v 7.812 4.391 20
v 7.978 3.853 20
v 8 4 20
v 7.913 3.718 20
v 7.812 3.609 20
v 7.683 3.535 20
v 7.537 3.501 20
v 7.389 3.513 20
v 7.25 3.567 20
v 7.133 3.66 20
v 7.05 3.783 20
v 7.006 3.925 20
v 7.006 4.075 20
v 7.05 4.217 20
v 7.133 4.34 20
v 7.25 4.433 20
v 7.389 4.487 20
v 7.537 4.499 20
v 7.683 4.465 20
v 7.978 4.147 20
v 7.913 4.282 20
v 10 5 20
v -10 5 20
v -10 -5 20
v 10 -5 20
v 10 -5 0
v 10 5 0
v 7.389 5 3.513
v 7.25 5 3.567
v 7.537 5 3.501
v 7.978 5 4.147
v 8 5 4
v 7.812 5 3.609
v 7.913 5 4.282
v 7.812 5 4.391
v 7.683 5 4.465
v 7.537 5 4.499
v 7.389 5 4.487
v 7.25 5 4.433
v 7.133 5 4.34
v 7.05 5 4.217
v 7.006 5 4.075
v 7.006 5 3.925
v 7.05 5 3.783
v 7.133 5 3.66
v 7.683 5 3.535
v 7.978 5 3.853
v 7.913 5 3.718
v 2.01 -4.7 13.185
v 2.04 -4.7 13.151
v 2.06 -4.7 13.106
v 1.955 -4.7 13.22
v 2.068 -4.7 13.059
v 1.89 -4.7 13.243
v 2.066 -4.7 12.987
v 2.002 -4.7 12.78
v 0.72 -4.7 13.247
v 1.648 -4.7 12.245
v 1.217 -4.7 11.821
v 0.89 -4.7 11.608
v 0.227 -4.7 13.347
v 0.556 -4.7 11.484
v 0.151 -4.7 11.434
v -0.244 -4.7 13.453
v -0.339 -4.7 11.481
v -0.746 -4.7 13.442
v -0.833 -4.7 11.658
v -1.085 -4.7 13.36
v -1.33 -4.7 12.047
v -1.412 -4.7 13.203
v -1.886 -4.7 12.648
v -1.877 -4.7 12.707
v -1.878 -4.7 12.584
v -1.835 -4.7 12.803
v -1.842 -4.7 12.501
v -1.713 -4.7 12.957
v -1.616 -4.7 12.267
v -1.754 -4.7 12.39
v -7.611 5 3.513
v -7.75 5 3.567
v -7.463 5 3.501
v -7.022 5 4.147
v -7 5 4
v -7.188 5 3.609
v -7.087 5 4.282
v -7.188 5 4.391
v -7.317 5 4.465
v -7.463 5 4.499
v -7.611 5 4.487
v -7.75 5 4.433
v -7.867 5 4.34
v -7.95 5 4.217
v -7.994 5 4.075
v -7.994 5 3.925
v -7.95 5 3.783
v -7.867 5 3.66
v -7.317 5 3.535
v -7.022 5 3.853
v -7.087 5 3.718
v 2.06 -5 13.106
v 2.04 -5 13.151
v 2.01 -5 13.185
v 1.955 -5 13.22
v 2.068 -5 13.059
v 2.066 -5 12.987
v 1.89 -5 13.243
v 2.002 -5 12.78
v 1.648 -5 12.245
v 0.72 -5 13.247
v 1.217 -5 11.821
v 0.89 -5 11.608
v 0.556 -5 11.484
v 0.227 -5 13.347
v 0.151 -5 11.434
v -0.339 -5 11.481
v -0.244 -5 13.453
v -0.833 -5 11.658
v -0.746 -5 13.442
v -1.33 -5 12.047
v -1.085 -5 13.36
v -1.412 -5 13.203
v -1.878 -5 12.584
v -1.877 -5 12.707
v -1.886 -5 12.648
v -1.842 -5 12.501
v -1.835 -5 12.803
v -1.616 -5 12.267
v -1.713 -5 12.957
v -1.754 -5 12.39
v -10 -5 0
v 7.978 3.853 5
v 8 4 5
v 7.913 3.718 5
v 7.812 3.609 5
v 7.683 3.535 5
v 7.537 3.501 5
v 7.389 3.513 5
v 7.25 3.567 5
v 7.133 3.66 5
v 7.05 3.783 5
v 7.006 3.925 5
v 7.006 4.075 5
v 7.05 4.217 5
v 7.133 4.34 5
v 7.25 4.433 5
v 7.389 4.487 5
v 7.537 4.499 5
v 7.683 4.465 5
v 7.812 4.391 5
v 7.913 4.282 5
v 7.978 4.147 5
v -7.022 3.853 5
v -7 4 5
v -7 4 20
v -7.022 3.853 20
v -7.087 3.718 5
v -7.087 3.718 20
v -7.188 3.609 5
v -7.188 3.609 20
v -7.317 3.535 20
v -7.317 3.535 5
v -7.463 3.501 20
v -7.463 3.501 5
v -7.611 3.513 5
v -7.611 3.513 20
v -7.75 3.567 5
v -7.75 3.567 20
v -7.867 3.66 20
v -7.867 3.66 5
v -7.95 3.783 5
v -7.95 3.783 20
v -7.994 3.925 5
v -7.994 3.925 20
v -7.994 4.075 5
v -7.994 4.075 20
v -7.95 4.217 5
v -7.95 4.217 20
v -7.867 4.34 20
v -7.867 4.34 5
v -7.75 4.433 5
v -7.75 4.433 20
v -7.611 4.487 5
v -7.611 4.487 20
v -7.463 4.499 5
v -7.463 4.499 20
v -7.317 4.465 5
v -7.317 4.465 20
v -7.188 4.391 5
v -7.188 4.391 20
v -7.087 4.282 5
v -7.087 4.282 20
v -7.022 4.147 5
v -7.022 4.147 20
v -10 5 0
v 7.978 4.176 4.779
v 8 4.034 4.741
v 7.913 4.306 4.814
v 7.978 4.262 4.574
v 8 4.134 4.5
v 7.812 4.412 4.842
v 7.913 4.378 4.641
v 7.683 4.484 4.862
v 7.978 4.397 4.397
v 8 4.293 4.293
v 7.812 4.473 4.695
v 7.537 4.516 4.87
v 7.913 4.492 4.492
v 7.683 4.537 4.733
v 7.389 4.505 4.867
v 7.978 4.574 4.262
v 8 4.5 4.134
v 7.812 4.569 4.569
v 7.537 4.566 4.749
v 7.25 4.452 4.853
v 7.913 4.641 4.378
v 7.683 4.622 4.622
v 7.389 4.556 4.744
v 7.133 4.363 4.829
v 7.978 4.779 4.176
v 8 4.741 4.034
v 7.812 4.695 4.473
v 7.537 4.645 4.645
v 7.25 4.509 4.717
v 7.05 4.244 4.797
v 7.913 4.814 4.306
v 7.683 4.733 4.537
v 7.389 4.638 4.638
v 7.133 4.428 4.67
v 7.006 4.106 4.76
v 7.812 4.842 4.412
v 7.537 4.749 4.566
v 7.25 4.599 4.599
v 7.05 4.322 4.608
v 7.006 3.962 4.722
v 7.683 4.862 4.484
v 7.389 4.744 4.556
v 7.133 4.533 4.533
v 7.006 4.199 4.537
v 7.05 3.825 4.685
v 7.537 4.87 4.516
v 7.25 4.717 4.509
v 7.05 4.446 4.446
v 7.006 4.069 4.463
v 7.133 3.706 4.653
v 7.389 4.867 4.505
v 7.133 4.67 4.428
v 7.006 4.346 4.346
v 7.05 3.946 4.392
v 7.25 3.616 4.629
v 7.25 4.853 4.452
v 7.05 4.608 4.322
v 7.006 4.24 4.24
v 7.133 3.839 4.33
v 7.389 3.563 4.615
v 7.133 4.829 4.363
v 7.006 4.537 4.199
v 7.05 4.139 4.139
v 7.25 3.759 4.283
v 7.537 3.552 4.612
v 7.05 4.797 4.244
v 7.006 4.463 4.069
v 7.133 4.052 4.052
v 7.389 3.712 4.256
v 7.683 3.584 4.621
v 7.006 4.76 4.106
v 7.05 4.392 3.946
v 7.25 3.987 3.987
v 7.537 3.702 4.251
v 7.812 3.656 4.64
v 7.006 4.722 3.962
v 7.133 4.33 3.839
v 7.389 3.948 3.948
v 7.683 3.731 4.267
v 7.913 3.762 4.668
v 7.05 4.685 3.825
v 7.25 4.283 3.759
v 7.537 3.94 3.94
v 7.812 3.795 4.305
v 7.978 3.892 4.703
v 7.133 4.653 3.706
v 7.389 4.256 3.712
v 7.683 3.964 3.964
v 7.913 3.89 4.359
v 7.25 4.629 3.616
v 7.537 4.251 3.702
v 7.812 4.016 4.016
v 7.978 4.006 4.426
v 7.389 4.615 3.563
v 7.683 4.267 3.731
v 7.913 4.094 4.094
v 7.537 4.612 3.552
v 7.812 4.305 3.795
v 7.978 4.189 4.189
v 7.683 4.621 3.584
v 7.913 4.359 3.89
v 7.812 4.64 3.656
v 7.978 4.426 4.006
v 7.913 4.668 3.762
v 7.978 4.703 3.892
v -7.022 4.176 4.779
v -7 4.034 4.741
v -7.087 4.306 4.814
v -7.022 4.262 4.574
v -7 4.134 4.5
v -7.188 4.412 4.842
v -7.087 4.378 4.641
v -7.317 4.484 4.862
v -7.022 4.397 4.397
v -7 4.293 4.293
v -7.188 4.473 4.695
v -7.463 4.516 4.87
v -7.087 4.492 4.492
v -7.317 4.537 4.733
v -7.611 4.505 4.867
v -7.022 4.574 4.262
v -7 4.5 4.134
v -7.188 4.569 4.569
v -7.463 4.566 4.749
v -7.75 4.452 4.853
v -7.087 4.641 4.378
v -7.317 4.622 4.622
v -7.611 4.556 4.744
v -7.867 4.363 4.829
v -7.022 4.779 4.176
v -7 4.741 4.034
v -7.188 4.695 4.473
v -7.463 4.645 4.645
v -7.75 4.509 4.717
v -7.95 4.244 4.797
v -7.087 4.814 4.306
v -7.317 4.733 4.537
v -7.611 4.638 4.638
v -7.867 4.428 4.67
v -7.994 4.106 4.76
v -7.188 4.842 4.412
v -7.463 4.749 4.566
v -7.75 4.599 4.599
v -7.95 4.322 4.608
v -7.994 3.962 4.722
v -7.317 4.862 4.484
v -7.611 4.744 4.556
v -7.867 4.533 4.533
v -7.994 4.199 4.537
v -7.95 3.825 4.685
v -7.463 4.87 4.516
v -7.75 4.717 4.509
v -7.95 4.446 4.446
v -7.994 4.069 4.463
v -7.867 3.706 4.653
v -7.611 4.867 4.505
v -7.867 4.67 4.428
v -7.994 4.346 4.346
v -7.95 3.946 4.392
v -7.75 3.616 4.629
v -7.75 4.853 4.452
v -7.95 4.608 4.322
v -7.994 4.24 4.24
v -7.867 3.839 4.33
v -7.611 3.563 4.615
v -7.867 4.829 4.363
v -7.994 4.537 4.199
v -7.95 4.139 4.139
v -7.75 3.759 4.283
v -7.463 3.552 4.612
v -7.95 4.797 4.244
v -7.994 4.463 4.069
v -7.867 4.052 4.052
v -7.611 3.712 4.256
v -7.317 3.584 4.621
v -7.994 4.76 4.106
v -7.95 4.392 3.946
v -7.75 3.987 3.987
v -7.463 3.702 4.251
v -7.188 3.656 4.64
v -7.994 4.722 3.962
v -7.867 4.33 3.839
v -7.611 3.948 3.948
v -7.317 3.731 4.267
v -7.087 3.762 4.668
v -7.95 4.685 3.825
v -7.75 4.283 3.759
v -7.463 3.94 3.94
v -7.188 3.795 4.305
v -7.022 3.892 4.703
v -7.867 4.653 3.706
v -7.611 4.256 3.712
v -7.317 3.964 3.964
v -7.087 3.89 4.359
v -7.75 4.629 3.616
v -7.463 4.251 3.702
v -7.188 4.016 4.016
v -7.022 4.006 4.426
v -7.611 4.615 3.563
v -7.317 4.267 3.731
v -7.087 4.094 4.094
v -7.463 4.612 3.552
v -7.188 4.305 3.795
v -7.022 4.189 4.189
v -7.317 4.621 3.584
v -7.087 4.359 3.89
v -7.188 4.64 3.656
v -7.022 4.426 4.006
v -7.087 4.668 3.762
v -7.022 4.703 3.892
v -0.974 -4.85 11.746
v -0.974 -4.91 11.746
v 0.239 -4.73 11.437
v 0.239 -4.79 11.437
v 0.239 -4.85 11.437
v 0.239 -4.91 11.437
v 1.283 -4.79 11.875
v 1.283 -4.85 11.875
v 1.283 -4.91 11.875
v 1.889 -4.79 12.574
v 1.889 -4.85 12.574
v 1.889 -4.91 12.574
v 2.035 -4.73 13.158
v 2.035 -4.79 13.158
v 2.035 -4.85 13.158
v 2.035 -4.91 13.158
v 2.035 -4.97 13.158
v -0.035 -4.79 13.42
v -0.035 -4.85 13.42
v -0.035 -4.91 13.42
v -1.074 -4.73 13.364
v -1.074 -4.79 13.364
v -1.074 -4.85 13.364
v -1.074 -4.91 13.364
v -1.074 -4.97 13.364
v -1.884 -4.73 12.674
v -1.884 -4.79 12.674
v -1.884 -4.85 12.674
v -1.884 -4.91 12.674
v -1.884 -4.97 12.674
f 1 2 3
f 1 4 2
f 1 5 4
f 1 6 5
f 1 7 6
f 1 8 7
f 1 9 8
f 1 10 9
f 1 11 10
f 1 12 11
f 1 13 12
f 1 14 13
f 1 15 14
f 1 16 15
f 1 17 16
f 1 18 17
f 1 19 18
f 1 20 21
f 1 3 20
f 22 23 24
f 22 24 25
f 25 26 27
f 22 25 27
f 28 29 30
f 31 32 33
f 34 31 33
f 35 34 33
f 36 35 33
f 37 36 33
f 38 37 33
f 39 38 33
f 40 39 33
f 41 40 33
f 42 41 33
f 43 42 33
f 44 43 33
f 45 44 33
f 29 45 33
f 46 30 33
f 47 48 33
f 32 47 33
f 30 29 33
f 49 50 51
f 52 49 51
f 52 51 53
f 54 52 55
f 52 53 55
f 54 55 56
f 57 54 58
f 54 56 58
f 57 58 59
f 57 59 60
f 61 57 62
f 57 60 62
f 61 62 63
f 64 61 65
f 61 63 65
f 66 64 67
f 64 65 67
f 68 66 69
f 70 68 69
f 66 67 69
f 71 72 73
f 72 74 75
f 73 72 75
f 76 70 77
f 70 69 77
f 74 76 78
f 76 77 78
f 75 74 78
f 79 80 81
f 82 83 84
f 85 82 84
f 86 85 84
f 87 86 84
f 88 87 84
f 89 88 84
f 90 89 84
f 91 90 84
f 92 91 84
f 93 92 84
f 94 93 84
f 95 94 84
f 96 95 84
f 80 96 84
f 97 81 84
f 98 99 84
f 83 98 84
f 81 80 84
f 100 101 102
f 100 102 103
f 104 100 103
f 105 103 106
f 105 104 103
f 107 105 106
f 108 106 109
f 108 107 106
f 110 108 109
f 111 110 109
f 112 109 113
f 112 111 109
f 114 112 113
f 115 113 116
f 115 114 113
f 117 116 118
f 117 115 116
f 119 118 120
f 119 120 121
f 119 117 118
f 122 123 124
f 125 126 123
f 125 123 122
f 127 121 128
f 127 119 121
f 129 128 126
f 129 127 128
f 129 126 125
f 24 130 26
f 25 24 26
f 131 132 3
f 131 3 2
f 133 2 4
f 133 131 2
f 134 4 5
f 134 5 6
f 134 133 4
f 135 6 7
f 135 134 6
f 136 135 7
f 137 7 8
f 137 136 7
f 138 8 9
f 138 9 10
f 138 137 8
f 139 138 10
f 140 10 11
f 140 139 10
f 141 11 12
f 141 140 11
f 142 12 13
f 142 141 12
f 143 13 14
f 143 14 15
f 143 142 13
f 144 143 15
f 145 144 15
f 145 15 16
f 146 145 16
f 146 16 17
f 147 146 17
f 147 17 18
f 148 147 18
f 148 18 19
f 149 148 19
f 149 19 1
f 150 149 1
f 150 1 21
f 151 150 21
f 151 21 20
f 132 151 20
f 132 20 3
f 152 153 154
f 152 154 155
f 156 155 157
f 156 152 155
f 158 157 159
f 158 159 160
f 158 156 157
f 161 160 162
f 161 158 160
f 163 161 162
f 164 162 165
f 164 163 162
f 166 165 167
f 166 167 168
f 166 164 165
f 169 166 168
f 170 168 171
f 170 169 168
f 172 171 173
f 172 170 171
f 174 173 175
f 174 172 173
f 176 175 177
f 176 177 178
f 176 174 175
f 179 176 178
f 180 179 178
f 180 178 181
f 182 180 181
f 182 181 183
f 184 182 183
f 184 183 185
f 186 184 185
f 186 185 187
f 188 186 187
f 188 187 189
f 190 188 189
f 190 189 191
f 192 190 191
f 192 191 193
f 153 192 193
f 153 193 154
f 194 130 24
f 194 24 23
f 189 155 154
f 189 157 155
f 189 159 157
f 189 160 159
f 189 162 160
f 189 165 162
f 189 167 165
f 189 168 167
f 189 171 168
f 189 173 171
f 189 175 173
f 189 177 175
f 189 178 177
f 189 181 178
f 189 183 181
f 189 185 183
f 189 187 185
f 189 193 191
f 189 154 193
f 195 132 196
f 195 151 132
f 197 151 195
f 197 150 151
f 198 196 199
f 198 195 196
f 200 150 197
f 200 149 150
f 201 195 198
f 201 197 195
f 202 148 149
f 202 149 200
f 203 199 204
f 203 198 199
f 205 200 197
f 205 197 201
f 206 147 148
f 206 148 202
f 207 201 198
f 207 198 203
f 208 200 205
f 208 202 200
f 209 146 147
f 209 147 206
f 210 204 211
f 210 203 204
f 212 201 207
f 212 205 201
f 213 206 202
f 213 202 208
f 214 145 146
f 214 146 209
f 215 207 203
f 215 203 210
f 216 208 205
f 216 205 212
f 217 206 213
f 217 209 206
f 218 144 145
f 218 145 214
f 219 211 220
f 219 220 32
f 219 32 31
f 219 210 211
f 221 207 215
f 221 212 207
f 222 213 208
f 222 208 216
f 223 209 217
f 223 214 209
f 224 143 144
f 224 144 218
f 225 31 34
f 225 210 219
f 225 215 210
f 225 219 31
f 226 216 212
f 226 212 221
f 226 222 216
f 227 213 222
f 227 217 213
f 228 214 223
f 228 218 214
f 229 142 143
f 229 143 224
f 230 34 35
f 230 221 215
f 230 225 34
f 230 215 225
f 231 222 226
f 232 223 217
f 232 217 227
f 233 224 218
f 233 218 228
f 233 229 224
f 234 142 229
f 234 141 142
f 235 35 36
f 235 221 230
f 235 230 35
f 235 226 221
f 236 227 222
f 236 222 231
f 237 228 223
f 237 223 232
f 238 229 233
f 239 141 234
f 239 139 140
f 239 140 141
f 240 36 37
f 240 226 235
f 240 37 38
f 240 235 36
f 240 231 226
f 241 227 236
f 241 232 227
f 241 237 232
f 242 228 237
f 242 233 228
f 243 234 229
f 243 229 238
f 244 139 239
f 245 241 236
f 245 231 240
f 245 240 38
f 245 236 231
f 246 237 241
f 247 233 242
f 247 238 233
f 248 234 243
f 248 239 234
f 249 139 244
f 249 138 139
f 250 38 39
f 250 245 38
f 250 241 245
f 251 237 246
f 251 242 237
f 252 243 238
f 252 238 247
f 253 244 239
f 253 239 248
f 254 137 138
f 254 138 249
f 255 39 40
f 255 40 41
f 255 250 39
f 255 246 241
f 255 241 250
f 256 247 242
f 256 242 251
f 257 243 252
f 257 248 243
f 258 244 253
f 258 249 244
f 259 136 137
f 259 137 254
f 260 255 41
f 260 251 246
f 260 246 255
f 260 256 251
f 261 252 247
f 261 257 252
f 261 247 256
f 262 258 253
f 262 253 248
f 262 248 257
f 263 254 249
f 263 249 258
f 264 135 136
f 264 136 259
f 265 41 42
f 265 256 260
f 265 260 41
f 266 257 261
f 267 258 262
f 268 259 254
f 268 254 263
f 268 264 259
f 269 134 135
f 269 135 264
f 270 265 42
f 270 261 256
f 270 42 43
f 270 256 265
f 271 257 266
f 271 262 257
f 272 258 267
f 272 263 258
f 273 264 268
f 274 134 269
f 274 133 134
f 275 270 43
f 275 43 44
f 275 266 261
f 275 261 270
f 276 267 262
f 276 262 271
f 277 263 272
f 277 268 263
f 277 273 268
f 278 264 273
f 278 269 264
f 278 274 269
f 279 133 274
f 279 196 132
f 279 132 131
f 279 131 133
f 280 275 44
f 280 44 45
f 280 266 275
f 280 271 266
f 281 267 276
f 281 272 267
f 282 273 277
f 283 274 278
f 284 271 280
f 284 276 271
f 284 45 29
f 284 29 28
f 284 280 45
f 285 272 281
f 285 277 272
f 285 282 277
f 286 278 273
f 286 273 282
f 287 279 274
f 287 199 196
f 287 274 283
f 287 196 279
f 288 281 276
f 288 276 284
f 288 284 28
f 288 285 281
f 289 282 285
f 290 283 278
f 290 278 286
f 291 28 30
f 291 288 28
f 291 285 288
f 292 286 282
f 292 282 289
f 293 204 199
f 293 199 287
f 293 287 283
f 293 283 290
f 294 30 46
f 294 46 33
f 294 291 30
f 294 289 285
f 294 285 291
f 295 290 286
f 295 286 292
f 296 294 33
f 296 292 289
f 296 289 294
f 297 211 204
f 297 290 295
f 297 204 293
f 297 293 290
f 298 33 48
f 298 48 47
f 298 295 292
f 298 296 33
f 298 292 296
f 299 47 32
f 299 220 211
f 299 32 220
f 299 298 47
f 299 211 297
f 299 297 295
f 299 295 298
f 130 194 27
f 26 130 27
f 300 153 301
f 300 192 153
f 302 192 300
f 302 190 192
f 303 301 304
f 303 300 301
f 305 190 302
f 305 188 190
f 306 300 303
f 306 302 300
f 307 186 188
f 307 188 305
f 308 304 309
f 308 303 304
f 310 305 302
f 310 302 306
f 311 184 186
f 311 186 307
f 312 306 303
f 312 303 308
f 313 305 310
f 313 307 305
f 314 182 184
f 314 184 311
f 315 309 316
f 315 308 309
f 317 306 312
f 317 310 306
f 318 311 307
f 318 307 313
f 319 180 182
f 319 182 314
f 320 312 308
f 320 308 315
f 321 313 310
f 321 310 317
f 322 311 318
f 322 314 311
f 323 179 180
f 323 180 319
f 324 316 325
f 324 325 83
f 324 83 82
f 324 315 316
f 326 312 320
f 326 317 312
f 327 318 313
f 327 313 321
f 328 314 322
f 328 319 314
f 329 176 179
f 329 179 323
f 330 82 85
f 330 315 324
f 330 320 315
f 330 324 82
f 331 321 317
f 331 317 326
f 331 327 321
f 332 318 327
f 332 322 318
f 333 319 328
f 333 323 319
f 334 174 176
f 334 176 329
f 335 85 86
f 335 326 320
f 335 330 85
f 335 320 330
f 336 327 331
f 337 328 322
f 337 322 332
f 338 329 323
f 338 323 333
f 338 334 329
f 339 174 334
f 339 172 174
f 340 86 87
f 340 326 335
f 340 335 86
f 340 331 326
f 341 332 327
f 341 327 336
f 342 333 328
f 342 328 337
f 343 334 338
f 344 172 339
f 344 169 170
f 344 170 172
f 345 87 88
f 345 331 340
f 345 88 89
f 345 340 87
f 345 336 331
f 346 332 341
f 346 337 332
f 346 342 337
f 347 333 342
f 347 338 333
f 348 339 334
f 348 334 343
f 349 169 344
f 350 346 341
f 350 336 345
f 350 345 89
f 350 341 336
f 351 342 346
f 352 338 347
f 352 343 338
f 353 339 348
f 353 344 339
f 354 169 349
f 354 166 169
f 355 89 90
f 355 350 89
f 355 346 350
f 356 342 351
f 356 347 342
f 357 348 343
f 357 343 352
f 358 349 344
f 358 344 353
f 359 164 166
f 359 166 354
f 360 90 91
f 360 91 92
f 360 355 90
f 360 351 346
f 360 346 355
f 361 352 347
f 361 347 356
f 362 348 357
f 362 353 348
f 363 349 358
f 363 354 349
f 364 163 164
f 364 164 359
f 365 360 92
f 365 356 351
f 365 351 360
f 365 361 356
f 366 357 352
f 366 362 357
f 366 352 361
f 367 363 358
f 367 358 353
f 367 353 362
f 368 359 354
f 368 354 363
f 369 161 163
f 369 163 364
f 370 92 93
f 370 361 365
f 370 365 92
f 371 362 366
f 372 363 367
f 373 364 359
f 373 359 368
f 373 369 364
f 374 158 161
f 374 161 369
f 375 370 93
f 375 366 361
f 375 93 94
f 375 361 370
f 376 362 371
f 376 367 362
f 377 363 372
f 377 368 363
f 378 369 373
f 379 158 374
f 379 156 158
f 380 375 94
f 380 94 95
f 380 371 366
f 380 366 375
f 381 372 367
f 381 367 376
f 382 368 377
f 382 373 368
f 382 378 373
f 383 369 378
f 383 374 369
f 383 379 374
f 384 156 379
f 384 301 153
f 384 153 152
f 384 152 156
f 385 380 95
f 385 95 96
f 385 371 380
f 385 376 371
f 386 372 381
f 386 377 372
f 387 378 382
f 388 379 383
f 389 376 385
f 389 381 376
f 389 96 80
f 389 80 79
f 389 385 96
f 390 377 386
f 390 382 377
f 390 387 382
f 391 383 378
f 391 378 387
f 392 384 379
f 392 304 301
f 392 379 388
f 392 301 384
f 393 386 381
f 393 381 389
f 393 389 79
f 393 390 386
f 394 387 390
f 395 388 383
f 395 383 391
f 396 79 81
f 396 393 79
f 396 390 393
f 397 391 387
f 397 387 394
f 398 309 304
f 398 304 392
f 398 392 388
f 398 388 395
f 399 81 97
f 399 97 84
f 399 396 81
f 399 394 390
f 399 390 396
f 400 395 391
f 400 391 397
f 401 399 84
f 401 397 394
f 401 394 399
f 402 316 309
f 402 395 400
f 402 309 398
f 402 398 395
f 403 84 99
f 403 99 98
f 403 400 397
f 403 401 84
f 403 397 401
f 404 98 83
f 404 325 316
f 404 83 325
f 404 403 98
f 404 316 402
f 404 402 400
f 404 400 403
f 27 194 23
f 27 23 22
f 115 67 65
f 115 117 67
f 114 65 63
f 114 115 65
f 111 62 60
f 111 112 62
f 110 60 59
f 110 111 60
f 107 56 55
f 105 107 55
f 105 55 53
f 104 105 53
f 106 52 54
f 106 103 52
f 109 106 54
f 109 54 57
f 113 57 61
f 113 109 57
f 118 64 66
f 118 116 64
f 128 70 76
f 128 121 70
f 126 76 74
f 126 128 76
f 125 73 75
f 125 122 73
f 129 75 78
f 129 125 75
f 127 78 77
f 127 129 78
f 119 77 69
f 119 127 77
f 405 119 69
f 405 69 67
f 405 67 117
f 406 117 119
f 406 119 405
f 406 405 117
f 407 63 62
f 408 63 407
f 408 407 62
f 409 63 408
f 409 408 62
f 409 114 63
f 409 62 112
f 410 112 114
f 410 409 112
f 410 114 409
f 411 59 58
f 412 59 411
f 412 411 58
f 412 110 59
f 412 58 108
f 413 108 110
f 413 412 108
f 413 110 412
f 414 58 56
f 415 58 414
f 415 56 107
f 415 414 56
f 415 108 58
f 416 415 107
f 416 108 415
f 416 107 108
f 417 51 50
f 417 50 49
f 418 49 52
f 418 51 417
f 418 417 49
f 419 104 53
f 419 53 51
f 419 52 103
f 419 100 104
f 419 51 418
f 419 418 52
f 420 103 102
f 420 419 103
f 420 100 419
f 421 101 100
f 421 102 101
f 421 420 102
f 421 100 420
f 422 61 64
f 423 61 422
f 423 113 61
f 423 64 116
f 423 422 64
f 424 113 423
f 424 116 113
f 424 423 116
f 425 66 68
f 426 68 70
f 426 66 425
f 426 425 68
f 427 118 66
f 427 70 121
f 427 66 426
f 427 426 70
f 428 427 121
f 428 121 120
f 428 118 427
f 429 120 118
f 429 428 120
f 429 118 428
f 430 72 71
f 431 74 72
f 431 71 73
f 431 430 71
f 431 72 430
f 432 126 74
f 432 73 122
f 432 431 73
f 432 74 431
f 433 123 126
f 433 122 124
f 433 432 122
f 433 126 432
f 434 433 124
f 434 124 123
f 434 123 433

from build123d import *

# Parameters (mm, degrees)
SKETCH1_W           = 20
SKETCH1_H           = 10
BOSS_EXTRUDE1_DEPTH = 20
SKETCH2_R           = 0.5
SLICE_2_DEPTH       = 0.3


with BuildPart() as part:
    # Sketch1 → Boss-Extrude1 (new body)
    with BuildSketch(Plane.XY):
        Rectangle(SKETCH1_W, SKETCH1_H)
    extrude(amount=BOSS_EXTRUDE1_DEPTH)


with BuildPart() as body_2:
    # ag/agcl electrodes: sweep along a path in Sketch3
    with BuildLine(Plane(origin=(7.5, 0, 0), x_dir=(0, 0, -1), z_dir=(1, 0, 0))) as ag_agcl_electrodes_path:
        Line((-20, 4), (-5, 4))
        ThreePointArc((-5, 4), (-4.292893219, 4.292893219), (-4, 5))
    # Sketch2 → ag/agcl electrodes (sweep)
    with BuildSketch(Plane.XY.offset(20)):
        with Locations((-7.5, 4)):
            Circle(SKETCH2_R)
        with Locations((7.5, 4)):
            Circle(SKETCH2_R)
    sweep(path=ag_agcl_electrodes_path.line)


with BuildPart() as body_3:
    # Sketch4 → slice 2 (new body)
    with BuildSketch(Plane(origin=(0, -5, 0), x_dir=(1, 0, 0), z_dir=(0, 1, 0))):
        with BuildLine():
            add(Edge.make_bspline(
                [(-1.329786825, -12.04709664), (-1.196342031, -11.939424685), (-0.824147777, -11.548957834), (0.251281573, -11.322574475), (1.372606671, -11.746573561), (2.652909809, -13.571837262), (0.780549472, -13.104467787), (-0.122057097, -13.506347246), (-0.994791107, -13.460960152), (-1.586432094, -13.116889112), (-2.086144249, -12.539169772), (-1.569499382, -12.240512354), (-1.329786825, -12.04709664)],
                knots=[0, 0, 0, 0, 0.049562645, 0.182817887, 0.303261475, 0.461561344, 0.613381106, 0.684437877, 0.79516613, 0.866564728, 0.910968514, 1, 1, 1, 1], degree=3))
        make_face()
    extrude(amount=SLICE_2_DEPTH)


solid = Compound([part.part, body_2.part, body_3.part])
